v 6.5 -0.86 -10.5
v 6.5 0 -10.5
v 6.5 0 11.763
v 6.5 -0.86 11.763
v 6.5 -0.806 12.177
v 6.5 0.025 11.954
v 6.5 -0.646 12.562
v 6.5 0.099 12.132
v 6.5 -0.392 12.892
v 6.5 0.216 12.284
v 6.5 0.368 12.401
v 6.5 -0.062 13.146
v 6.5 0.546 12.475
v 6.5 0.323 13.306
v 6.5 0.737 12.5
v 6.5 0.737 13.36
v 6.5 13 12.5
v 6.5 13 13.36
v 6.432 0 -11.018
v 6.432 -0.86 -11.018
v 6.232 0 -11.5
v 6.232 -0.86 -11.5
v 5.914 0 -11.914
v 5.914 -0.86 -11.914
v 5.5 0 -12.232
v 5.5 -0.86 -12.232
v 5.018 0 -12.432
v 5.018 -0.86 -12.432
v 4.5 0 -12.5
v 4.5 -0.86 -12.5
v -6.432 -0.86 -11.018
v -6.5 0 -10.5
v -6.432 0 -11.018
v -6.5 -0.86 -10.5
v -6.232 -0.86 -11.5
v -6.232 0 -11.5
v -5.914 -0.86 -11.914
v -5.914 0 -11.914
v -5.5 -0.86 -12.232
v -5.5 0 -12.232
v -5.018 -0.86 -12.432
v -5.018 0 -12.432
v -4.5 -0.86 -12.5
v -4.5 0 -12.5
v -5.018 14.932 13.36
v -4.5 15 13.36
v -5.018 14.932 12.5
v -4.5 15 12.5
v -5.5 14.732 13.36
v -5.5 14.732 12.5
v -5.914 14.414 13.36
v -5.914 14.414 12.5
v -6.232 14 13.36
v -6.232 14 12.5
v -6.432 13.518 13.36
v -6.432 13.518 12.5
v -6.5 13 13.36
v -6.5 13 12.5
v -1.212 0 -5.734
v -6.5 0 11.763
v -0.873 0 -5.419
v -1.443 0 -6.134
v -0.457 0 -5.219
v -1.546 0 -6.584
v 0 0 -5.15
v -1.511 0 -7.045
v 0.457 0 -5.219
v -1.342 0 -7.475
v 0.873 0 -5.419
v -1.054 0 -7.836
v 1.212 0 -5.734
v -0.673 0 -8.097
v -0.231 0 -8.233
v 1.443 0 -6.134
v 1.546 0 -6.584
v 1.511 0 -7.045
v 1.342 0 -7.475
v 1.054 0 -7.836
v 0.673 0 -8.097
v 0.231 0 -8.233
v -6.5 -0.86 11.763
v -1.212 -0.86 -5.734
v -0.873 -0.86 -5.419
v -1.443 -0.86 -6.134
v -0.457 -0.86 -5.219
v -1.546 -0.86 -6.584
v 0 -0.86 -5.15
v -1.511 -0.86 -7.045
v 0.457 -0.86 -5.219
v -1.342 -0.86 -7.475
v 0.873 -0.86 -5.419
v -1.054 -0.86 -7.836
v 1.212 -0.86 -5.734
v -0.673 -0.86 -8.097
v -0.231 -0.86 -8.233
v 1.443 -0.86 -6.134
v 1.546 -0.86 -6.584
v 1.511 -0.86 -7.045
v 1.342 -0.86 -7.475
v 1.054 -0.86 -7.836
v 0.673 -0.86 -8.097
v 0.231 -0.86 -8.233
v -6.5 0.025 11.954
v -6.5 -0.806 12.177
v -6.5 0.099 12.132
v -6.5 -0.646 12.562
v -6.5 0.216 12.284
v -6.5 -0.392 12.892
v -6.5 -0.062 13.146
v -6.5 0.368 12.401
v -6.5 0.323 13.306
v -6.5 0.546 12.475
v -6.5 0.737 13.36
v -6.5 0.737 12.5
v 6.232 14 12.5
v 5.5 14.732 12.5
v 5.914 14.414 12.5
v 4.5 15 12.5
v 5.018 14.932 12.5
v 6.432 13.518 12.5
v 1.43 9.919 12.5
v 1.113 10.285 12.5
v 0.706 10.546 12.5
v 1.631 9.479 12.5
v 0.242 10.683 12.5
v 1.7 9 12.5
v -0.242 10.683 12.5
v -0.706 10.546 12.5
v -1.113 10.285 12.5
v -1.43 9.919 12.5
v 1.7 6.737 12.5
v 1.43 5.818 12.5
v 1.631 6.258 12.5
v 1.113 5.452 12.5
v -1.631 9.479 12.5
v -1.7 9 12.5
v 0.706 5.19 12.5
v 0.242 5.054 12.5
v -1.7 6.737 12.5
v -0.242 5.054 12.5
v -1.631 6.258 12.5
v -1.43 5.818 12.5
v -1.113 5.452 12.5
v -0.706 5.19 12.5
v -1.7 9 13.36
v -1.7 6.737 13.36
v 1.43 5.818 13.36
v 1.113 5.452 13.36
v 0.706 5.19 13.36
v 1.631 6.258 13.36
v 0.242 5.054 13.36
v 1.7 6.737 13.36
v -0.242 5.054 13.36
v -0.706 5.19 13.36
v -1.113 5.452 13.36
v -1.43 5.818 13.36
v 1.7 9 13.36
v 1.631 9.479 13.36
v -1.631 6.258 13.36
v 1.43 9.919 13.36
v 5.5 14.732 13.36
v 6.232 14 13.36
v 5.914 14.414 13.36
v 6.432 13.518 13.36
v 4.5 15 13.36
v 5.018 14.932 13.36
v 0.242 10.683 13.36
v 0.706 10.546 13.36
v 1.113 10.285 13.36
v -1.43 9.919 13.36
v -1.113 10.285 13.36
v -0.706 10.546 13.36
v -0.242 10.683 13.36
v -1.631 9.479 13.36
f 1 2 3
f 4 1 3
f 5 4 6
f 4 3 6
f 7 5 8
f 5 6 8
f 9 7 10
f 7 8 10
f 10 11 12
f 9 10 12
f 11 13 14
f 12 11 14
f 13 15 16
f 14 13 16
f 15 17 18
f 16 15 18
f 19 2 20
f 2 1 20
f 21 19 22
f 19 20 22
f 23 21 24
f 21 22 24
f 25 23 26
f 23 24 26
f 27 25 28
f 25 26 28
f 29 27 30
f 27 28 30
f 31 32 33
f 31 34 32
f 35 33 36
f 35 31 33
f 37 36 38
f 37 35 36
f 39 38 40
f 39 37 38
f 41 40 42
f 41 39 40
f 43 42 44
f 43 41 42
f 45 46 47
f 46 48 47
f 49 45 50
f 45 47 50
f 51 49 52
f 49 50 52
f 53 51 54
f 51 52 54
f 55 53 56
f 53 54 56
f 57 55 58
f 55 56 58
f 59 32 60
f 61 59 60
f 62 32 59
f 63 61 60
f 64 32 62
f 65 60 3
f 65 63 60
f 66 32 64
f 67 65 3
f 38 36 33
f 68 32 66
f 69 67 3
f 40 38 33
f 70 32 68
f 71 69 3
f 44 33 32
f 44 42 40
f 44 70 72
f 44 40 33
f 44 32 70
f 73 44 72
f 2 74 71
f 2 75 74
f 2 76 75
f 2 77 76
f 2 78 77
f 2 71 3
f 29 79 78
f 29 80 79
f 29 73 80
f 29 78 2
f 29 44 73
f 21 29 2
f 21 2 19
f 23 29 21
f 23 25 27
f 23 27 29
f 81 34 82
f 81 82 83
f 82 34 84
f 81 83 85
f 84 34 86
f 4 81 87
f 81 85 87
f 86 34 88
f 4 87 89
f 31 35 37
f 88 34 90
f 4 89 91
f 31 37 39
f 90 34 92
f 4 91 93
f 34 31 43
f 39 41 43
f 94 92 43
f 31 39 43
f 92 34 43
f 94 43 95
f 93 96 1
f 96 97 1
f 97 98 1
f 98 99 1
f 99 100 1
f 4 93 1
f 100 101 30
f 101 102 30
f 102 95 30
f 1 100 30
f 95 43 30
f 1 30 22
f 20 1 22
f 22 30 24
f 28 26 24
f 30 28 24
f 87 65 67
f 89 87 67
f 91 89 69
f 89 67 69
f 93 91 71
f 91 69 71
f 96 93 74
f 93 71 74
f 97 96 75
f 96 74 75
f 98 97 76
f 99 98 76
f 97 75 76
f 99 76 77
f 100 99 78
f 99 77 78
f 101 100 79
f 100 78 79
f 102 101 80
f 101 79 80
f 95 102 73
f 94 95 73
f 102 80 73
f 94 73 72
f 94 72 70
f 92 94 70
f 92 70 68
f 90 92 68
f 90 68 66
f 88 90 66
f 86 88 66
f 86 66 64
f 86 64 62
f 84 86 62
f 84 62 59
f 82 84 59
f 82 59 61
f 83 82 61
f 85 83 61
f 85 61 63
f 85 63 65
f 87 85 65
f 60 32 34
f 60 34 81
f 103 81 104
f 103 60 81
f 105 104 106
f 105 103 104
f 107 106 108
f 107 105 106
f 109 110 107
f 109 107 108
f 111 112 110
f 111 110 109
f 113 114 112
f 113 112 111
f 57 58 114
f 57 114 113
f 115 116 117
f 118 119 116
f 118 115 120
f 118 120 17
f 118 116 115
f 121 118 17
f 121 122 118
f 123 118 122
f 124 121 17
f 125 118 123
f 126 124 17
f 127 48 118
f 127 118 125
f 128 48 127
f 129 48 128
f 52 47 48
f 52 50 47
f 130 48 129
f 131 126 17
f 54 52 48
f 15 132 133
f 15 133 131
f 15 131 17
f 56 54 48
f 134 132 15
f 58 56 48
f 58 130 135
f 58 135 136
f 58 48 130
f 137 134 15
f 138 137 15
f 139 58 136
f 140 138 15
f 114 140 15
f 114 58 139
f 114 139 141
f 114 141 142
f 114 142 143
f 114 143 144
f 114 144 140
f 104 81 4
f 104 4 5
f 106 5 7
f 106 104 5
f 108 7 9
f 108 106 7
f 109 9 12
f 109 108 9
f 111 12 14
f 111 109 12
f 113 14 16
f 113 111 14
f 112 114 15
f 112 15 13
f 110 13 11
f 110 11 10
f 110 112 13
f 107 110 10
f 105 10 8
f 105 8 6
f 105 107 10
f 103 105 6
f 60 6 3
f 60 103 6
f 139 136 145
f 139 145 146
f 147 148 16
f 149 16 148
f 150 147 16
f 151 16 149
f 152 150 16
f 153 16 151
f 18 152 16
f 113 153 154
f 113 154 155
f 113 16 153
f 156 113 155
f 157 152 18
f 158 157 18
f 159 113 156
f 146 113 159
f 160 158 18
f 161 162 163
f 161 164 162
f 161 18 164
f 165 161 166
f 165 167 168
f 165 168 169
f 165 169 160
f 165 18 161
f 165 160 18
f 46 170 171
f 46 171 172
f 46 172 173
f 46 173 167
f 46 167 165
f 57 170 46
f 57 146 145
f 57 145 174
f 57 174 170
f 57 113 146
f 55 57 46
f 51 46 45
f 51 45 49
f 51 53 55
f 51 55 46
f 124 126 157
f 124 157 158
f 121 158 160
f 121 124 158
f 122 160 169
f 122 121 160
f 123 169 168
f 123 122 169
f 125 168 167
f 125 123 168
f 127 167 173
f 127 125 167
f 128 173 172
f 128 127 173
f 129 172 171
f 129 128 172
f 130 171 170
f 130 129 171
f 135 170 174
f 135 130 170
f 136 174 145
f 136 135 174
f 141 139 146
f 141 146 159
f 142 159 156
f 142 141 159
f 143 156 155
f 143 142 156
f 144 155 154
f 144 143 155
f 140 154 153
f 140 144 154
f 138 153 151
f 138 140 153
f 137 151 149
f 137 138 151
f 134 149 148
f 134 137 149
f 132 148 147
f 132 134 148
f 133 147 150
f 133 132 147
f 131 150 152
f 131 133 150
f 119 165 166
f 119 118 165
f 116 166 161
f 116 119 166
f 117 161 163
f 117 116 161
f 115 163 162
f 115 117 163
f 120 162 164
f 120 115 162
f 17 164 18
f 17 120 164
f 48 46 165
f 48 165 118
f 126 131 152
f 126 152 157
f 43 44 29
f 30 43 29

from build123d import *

# Parameters (mm, degrees)
SKETCH1_W                    = 13
SKETCH1_H                    = 25
BASE_FLANGE1_DEPTH           = 0.86
EDGE_FLANGE1_STRIP_W         = 4.9132
EDGE_FLANGE1_STRIP_H         = 0.86
EDGE_FLANGE1_STRIP_CUT_DEPTH = 13
EDGE_FLANGE1_DEPTH           = 13
FILLET1_R                    = 2
SKETCH10_R                   = 1.55
CUT_EXTRUDE1_DEPTH           = 22.112546033
CUT_EXTRUDE2_DEPTH           = 30.870554062


# Sheet-metal steps are written as plain solids
with BuildPart() as part:
    # Sketch1 → Base-Flange1 (new body)
    with BuildSketch(Plane(origin=(0, 0, 0), x_dir=(1, 0, 0), z_dir=(0, 1, 0))):
        Rectangle(SKETCH1_W, SKETCH1_H)
    extrude(amount=-BASE_FLANGE1_DEPTH)

    # Edge-Flange1 strip (across the edge) → Edge-Flange1 strip cut (cut)
    with BuildSketch(Plane(origin=(-6.5, 0, 12.5), x_dir=(0, 0, -1), z_dir=(1, 0, 0))):
        with Locations((-1.72, -0.43)):
            Rectangle(EDGE_FLANGE1_STRIP_W, EDGE_FLANGE1_STRIP_H)
    extrude(amount=EDGE_FLANGE1_STRIP_CUT_DEPTH, mode=Mode.SUBTRACT)

    # Edge-Flange1 section (across the edge) → Edge-Flange1 (add)
    with BuildSketch(Plane(origin=(-6.5, 0, 12.5), x_dir=(0, 0, -1), z_dir=(1, 0, 0))):
        with BuildLine():
            Line((-0.86, 0.7366), (-0.86, 15))
            Line((-0.86, 15), (0, 15))
            Line((0, 15), (0, 0.7366))
            ThreePointArc((0, 0.7366), (0.215745145, 0.215745145), (0.7366, 0))
            Line((0.7366, 0), (0.7366, -0.86))
            ThreePointArc((0.7366, -0.86), (-0.392366687, -0.392366687), (-0.86, 0.7366))
        make_face()
    extrude(amount=EDGE_FLANGE1_DEPTH)

    # Fillet1
    fillet1_edges = [part.edges().sort_by_distance(p)[0] for p in [
        (-6.5, 15, 12.93),
        (6.5, 15, 12.93),
        (-6.5, -0.43, -12.5),
        (6.5, -0.43, -12.5),
    ]]
    fillet(fillet1_edges, radius=FILLET1_R)

    # Sketch10 → Cut-Extrude1 (cut, through all)
    with BuildSketch(Plane(origin=(0, 0, 0), x_dir=(1, 0, 0), z_dir=(0, 1, 0))):
        with Locations(Location((0, 6.7, 0), (0, 0, 270))):
            Circle(SKETCH10_R)
    extrude(amount=-CUT_EXTRUDE1_DEPTH, mode=Mode.SUBTRACT)

    # Sketch11 → Cut-Extrude2 (cut, through all)
    with BuildSketch(Plane(origin=(0, 0, 12.5), x_dir=(-1, 0, 0), z_dir=(0, 0, -1))):
        with BuildLine():
            Line((1.7, 9), (1.7, 6.7366))
            ThreePointArc((1.7, 6.7366), (0, 5.0366), (-1.7, 6.7366))
            Line((-1.7, 6.7366), (-1.7, 9))
            ThreePointArc((-1.7, 9), (0, 10.7), (1.7, 9))
        make_face()
    extrude(amount=-CUT_EXTRUDE2_DEPTH, mode=Mode.SUBTRACT)


solid = part.part
